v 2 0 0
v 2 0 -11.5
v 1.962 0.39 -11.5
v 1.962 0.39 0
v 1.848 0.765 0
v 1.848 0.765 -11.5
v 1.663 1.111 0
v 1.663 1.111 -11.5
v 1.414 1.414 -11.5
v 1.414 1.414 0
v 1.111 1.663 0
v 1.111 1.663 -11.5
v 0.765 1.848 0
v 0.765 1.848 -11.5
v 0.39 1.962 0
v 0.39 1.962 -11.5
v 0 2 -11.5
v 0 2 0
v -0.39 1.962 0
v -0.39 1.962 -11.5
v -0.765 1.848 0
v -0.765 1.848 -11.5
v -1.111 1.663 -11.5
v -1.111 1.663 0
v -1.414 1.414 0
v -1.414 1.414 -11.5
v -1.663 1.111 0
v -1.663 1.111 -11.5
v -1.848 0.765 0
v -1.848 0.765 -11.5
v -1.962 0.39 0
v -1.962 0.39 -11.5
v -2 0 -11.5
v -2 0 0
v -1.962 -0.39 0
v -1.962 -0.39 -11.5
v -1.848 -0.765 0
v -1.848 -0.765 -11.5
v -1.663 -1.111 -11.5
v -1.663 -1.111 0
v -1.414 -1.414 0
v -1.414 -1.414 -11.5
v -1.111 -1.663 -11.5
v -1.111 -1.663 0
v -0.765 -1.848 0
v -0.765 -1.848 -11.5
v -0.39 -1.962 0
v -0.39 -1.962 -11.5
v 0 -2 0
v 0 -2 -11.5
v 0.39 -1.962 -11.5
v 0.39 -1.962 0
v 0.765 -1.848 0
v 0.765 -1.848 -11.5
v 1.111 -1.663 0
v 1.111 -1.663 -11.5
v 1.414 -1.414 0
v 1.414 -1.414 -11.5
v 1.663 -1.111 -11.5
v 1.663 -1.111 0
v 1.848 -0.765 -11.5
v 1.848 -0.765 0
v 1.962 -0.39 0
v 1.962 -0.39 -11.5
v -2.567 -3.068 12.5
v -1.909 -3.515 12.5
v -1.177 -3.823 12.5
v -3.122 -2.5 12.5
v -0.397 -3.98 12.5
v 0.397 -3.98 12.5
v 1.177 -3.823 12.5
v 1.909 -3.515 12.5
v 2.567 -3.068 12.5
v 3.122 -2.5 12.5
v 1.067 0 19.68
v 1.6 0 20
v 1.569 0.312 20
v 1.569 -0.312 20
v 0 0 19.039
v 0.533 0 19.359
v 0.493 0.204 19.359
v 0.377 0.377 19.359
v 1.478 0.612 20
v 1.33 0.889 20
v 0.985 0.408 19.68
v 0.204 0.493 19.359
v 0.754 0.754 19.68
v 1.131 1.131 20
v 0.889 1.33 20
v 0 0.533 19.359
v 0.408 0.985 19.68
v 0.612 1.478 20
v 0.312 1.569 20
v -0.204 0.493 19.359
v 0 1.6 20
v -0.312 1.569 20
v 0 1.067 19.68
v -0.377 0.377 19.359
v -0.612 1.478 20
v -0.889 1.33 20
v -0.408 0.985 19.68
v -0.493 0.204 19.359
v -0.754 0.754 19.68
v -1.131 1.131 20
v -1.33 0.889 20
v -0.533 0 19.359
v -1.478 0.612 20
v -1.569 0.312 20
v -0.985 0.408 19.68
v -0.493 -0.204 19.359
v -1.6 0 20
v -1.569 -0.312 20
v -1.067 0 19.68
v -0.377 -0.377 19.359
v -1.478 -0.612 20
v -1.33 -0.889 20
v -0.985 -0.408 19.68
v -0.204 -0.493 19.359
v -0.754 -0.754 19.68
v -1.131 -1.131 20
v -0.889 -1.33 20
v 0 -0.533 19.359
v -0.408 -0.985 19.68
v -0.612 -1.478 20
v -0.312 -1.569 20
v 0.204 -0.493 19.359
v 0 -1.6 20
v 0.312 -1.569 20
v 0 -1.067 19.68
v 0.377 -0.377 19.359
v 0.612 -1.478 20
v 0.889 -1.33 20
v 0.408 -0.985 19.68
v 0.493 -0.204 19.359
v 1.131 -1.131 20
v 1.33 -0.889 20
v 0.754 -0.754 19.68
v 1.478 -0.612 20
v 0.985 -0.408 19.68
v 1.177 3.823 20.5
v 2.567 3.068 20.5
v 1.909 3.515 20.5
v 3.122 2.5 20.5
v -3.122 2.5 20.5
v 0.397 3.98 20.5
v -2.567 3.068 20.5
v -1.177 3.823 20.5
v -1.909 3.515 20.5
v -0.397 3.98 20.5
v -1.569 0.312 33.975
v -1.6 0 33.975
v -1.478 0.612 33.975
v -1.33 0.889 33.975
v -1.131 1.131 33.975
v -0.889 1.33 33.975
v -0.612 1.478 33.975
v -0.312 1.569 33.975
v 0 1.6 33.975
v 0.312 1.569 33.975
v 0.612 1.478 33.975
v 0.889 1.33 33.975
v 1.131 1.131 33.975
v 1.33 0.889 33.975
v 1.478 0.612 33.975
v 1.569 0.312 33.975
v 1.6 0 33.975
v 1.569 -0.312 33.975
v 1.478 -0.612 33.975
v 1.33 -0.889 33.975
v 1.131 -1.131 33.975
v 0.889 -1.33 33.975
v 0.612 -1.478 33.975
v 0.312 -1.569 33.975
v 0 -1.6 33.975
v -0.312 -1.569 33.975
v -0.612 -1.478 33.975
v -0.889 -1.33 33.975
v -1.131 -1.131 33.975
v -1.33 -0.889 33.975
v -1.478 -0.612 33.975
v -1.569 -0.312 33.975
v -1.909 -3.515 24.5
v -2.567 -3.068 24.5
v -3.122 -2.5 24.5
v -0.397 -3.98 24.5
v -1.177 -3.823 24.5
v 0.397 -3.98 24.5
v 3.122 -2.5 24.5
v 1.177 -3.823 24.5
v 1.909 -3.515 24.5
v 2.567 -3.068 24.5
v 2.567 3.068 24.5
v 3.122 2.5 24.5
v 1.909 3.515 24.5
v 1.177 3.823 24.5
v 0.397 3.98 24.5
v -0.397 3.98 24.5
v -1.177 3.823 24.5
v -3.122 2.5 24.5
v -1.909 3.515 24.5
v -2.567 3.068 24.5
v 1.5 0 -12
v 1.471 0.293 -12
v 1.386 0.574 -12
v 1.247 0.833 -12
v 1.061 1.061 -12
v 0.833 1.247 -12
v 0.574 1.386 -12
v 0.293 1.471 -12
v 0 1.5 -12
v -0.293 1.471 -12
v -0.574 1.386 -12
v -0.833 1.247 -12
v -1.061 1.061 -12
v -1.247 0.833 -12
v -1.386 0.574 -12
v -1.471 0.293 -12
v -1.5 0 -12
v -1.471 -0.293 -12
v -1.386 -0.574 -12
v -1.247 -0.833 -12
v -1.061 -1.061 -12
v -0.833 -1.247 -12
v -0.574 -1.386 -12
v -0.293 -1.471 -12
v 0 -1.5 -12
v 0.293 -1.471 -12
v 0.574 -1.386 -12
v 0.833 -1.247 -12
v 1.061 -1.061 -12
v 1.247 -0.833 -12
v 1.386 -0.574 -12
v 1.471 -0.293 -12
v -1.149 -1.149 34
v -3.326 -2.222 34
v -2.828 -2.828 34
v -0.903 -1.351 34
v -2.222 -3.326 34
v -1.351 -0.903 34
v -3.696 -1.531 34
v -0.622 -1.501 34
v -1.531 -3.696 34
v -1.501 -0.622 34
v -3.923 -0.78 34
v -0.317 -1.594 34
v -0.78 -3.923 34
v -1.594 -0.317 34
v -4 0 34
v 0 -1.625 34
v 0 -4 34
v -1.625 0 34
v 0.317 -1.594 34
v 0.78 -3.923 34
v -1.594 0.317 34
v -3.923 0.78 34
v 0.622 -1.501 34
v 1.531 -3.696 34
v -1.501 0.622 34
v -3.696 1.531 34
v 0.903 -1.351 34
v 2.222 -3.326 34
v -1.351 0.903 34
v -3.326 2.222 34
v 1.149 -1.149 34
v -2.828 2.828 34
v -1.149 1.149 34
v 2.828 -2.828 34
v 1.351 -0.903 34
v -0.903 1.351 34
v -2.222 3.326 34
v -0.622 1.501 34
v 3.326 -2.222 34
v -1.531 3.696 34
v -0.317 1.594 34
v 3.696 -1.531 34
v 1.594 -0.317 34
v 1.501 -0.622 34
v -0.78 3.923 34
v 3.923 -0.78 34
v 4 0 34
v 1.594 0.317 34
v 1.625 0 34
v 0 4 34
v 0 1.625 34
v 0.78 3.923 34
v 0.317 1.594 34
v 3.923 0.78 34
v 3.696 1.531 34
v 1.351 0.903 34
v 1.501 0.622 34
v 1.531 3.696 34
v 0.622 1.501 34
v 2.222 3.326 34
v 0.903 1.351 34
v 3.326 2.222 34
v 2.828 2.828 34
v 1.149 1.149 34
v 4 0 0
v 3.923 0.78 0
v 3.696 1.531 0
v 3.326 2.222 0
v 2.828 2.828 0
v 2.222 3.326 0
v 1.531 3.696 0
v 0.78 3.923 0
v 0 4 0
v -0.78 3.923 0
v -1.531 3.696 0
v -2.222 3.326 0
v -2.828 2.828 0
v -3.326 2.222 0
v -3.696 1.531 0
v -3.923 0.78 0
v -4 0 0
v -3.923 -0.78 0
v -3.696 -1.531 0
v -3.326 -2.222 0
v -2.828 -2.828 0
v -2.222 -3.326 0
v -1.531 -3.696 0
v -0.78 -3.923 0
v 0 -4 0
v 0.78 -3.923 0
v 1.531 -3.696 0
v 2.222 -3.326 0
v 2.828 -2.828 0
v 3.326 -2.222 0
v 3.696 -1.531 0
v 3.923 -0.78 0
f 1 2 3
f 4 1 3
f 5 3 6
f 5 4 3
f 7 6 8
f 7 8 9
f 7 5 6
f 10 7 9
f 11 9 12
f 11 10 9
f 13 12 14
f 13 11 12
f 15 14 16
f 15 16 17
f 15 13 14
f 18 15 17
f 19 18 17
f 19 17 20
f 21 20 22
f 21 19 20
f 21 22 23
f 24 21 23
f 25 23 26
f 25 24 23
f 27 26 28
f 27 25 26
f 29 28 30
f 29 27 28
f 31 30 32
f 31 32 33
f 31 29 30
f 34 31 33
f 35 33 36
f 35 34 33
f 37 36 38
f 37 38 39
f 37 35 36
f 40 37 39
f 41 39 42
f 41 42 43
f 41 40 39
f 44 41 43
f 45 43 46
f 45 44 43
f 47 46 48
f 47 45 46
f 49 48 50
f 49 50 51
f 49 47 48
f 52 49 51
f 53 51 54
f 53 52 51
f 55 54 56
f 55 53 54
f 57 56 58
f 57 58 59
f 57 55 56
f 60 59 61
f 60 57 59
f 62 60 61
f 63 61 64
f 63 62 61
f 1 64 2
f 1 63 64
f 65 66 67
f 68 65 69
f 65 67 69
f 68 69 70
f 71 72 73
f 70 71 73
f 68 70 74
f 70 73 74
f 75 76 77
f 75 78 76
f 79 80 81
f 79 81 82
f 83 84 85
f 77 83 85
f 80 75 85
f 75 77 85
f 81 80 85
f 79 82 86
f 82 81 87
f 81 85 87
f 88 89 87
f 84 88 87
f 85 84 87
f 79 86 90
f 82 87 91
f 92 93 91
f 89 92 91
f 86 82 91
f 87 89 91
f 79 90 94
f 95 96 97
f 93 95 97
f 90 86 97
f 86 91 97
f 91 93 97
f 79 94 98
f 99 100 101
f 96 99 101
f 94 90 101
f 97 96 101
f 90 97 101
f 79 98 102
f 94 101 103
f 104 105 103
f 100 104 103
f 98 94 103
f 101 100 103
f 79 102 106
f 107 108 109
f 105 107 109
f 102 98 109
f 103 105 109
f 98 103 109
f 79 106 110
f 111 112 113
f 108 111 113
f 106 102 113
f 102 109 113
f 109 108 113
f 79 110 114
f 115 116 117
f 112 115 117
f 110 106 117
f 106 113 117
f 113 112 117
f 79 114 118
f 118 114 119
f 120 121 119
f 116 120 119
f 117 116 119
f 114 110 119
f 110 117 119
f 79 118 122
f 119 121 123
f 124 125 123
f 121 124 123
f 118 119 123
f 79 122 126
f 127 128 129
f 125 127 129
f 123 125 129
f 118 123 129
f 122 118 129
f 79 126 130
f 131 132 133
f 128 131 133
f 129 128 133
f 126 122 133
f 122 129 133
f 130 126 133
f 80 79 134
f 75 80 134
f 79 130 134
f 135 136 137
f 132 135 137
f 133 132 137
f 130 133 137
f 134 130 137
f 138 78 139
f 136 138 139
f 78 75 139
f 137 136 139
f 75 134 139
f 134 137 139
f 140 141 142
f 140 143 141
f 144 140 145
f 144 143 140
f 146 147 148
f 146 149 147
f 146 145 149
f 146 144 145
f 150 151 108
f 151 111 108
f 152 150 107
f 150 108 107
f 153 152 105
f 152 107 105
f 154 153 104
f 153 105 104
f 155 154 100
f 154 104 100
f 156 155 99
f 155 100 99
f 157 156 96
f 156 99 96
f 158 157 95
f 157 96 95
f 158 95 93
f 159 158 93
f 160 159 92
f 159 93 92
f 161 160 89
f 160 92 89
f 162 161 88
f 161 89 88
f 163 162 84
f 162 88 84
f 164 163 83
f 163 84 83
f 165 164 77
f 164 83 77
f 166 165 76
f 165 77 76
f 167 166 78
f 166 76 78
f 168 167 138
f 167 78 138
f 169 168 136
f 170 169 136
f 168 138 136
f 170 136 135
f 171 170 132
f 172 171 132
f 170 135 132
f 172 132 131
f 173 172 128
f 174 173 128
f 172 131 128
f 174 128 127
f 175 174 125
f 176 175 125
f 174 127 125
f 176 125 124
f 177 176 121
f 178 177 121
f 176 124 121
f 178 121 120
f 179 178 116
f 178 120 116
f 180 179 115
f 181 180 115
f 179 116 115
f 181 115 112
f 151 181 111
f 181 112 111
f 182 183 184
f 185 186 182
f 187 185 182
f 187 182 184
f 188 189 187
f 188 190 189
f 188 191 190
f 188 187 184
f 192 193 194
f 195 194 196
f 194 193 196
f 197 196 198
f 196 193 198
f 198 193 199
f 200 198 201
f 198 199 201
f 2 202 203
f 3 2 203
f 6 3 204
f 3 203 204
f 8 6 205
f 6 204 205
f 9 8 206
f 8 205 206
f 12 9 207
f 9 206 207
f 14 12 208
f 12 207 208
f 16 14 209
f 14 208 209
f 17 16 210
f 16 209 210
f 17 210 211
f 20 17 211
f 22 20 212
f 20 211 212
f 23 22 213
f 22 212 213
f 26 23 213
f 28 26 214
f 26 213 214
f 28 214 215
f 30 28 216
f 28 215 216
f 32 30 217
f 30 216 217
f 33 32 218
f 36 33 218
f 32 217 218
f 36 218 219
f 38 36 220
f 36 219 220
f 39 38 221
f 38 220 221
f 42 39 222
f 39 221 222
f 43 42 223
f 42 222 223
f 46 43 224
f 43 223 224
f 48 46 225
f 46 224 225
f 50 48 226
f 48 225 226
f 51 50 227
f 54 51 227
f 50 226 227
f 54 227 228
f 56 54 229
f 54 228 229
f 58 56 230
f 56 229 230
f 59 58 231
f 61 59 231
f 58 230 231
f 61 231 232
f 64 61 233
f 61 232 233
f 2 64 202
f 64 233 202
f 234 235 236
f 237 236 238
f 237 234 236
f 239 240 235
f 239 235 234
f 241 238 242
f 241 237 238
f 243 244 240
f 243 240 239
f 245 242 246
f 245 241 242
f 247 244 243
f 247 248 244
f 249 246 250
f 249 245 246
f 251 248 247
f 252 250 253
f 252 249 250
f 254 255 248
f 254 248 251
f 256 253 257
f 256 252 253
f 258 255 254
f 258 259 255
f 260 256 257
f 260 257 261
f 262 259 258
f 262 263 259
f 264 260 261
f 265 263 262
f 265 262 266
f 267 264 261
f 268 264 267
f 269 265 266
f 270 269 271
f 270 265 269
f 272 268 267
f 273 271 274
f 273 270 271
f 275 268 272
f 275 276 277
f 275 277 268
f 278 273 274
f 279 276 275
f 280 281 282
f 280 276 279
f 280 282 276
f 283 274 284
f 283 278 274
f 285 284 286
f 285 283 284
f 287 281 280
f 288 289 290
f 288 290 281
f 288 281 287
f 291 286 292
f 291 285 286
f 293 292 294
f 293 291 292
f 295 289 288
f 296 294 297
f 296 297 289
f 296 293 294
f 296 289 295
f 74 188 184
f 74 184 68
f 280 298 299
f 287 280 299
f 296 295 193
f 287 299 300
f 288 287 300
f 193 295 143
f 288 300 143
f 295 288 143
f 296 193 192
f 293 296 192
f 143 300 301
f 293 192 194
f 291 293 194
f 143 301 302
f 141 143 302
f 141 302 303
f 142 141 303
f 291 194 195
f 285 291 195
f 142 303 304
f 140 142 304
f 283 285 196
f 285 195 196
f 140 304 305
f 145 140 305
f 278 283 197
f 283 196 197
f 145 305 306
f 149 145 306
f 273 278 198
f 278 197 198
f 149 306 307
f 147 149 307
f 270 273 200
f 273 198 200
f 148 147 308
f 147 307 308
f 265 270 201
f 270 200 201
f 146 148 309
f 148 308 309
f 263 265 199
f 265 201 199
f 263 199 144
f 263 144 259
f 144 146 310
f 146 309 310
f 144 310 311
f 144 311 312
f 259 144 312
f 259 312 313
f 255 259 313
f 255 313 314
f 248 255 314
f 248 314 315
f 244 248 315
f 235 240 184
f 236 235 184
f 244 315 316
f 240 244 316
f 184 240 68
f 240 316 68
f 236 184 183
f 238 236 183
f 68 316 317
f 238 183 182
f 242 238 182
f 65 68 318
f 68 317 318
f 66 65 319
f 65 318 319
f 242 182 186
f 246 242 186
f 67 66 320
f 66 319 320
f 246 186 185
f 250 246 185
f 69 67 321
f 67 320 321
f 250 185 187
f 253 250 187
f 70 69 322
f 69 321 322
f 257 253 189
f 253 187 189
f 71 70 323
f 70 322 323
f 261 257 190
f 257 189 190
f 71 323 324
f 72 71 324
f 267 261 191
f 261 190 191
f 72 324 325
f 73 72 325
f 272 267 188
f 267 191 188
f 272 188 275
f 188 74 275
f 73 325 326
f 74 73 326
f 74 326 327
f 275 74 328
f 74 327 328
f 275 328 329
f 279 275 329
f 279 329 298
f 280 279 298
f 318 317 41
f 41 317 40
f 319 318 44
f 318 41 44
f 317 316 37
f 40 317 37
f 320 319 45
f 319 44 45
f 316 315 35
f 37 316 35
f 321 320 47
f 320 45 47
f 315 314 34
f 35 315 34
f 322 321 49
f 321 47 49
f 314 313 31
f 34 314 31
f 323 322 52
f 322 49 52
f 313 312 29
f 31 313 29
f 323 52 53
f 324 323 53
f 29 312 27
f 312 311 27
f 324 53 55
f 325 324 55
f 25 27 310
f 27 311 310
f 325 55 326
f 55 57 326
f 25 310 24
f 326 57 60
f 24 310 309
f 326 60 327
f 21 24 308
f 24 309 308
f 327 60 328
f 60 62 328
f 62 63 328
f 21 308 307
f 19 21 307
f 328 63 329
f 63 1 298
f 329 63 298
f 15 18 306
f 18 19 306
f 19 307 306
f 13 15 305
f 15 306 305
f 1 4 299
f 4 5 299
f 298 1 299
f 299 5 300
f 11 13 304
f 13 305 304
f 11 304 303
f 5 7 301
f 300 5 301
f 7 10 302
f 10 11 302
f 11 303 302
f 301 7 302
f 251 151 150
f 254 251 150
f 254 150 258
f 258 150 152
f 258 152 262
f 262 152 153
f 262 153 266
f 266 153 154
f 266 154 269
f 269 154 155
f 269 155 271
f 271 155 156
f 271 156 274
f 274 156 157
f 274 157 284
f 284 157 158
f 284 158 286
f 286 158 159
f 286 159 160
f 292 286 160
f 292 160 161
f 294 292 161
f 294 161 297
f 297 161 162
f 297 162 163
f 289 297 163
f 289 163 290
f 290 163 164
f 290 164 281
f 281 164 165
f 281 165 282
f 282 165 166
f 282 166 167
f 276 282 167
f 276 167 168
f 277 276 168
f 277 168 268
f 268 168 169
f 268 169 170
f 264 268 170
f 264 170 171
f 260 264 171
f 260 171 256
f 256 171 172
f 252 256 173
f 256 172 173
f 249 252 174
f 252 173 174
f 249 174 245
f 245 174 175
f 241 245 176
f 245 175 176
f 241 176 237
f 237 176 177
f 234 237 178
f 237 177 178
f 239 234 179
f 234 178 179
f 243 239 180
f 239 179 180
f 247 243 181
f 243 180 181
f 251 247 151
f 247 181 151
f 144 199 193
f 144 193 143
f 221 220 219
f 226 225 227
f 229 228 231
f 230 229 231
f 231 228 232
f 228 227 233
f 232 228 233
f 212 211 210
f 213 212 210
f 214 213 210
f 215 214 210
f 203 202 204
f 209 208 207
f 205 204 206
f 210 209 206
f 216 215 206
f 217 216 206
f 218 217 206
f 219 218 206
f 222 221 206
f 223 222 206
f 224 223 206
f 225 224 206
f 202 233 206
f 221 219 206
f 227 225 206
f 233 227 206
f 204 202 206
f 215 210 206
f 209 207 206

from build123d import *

# Parameters (mm, degrees)
SKETCH1_R                            = 2
BOSS_EXTRUDE3_DEPTH                  = 12
SKETCH3_R                            = 4
BOSS_EXTRUDE4_DEPTH                  = 34
SKETCH4_W                            = 4
SKETCH4_H                            = 1.5
SKETCH4_W_2                          = 12
CUT_EXTRUDE1_DEPTH                   = 17
F_3_2_3_2_DIAMETER_HOLE1_D           = 3.2
F_3_2_3_2_DIAMETER_HOLE1_DEPTH       = 14
F_3_2_3_2_DIAMETER_HOLE1_CSINK_D     = 3.25
F_3_2_3_2_DIAMETER_HOLE1_CSINK_ANGLE = 90
F_3_2_3_2_DIAMETER_HOLE1_TIP         = 0.96137699
CHAMFER1_SIZE                        = 0.5


with BuildPart() as part:
    # Sketch1 → Boss-Extrude3 (new body)
    with BuildSketch(Plane.XY):
        Circle(SKETCH1_R)
    extrude(amount=-BOSS_EXTRUDE3_DEPTH)

    # Sketch3 → Boss-Extrude4 (add)
    with BuildSketch(Plane.XY):
        Circle(SKETCH3_R)
    extrude(amount=BOSS_EXTRUDE4_DEPTH)

    # Sketch4 → Cut-Extrude1 (cut, symmetric)
    with BuildSketch(Plane(origin=(0, 0, 0), x_dir=(0, 0, -1), z_dir=(1, 0, 0))):
        with Locations((-22.5, 3.25)):
            Rectangle(SKETCH4_W, SKETCH4_H)
        with Locations((-18.5, -3.25)):
            Rectangle(SKETCH4_W_2, SKETCH4_H)
    extrude(amount=CUT_EXTRUDE1_DEPTH, both=True, mode=Mode.SUBTRACT)

    # Ø3.2 (3.2) Diameter Hole1
    with Locations(Plane.XY.offset(34)):
        with Locations((0, 0)):
            CounterSinkHole(F_3_2_3_2_DIAMETER_HOLE1_D / 2, F_3_2_3_2_DIAMETER_HOLE1_CSINK_D / 2, depth=F_3_2_3_2_DIAMETER_HOLE1_DEPTH, counter_sink_angle=F_3_2_3_2_DIAMETER_HOLE1_CSINK_ANGLE)
            with Locations((0, 0, -(F_3_2_3_2_DIAMETER_HOLE1_DEPTH + F_3_2_3_2_DIAMETER_HOLE1_TIP / 2))):  # 118° drill point
                Cone(0, F_3_2_3_2_DIAMETER_HOLE1_D / 2, F_3_2_3_2_DIAMETER_HOLE1_TIP, mode=Mode.SUBTRACT)

    # Chamfer1
    chamfer1_edges = [part.edges().sort_by_distance(p)[0] for p in [
        (-2, 0, -12),
    ]]
    chamfer(chamfer1_edges, length=CHAMFER1_SIZE)


solid = part.part
